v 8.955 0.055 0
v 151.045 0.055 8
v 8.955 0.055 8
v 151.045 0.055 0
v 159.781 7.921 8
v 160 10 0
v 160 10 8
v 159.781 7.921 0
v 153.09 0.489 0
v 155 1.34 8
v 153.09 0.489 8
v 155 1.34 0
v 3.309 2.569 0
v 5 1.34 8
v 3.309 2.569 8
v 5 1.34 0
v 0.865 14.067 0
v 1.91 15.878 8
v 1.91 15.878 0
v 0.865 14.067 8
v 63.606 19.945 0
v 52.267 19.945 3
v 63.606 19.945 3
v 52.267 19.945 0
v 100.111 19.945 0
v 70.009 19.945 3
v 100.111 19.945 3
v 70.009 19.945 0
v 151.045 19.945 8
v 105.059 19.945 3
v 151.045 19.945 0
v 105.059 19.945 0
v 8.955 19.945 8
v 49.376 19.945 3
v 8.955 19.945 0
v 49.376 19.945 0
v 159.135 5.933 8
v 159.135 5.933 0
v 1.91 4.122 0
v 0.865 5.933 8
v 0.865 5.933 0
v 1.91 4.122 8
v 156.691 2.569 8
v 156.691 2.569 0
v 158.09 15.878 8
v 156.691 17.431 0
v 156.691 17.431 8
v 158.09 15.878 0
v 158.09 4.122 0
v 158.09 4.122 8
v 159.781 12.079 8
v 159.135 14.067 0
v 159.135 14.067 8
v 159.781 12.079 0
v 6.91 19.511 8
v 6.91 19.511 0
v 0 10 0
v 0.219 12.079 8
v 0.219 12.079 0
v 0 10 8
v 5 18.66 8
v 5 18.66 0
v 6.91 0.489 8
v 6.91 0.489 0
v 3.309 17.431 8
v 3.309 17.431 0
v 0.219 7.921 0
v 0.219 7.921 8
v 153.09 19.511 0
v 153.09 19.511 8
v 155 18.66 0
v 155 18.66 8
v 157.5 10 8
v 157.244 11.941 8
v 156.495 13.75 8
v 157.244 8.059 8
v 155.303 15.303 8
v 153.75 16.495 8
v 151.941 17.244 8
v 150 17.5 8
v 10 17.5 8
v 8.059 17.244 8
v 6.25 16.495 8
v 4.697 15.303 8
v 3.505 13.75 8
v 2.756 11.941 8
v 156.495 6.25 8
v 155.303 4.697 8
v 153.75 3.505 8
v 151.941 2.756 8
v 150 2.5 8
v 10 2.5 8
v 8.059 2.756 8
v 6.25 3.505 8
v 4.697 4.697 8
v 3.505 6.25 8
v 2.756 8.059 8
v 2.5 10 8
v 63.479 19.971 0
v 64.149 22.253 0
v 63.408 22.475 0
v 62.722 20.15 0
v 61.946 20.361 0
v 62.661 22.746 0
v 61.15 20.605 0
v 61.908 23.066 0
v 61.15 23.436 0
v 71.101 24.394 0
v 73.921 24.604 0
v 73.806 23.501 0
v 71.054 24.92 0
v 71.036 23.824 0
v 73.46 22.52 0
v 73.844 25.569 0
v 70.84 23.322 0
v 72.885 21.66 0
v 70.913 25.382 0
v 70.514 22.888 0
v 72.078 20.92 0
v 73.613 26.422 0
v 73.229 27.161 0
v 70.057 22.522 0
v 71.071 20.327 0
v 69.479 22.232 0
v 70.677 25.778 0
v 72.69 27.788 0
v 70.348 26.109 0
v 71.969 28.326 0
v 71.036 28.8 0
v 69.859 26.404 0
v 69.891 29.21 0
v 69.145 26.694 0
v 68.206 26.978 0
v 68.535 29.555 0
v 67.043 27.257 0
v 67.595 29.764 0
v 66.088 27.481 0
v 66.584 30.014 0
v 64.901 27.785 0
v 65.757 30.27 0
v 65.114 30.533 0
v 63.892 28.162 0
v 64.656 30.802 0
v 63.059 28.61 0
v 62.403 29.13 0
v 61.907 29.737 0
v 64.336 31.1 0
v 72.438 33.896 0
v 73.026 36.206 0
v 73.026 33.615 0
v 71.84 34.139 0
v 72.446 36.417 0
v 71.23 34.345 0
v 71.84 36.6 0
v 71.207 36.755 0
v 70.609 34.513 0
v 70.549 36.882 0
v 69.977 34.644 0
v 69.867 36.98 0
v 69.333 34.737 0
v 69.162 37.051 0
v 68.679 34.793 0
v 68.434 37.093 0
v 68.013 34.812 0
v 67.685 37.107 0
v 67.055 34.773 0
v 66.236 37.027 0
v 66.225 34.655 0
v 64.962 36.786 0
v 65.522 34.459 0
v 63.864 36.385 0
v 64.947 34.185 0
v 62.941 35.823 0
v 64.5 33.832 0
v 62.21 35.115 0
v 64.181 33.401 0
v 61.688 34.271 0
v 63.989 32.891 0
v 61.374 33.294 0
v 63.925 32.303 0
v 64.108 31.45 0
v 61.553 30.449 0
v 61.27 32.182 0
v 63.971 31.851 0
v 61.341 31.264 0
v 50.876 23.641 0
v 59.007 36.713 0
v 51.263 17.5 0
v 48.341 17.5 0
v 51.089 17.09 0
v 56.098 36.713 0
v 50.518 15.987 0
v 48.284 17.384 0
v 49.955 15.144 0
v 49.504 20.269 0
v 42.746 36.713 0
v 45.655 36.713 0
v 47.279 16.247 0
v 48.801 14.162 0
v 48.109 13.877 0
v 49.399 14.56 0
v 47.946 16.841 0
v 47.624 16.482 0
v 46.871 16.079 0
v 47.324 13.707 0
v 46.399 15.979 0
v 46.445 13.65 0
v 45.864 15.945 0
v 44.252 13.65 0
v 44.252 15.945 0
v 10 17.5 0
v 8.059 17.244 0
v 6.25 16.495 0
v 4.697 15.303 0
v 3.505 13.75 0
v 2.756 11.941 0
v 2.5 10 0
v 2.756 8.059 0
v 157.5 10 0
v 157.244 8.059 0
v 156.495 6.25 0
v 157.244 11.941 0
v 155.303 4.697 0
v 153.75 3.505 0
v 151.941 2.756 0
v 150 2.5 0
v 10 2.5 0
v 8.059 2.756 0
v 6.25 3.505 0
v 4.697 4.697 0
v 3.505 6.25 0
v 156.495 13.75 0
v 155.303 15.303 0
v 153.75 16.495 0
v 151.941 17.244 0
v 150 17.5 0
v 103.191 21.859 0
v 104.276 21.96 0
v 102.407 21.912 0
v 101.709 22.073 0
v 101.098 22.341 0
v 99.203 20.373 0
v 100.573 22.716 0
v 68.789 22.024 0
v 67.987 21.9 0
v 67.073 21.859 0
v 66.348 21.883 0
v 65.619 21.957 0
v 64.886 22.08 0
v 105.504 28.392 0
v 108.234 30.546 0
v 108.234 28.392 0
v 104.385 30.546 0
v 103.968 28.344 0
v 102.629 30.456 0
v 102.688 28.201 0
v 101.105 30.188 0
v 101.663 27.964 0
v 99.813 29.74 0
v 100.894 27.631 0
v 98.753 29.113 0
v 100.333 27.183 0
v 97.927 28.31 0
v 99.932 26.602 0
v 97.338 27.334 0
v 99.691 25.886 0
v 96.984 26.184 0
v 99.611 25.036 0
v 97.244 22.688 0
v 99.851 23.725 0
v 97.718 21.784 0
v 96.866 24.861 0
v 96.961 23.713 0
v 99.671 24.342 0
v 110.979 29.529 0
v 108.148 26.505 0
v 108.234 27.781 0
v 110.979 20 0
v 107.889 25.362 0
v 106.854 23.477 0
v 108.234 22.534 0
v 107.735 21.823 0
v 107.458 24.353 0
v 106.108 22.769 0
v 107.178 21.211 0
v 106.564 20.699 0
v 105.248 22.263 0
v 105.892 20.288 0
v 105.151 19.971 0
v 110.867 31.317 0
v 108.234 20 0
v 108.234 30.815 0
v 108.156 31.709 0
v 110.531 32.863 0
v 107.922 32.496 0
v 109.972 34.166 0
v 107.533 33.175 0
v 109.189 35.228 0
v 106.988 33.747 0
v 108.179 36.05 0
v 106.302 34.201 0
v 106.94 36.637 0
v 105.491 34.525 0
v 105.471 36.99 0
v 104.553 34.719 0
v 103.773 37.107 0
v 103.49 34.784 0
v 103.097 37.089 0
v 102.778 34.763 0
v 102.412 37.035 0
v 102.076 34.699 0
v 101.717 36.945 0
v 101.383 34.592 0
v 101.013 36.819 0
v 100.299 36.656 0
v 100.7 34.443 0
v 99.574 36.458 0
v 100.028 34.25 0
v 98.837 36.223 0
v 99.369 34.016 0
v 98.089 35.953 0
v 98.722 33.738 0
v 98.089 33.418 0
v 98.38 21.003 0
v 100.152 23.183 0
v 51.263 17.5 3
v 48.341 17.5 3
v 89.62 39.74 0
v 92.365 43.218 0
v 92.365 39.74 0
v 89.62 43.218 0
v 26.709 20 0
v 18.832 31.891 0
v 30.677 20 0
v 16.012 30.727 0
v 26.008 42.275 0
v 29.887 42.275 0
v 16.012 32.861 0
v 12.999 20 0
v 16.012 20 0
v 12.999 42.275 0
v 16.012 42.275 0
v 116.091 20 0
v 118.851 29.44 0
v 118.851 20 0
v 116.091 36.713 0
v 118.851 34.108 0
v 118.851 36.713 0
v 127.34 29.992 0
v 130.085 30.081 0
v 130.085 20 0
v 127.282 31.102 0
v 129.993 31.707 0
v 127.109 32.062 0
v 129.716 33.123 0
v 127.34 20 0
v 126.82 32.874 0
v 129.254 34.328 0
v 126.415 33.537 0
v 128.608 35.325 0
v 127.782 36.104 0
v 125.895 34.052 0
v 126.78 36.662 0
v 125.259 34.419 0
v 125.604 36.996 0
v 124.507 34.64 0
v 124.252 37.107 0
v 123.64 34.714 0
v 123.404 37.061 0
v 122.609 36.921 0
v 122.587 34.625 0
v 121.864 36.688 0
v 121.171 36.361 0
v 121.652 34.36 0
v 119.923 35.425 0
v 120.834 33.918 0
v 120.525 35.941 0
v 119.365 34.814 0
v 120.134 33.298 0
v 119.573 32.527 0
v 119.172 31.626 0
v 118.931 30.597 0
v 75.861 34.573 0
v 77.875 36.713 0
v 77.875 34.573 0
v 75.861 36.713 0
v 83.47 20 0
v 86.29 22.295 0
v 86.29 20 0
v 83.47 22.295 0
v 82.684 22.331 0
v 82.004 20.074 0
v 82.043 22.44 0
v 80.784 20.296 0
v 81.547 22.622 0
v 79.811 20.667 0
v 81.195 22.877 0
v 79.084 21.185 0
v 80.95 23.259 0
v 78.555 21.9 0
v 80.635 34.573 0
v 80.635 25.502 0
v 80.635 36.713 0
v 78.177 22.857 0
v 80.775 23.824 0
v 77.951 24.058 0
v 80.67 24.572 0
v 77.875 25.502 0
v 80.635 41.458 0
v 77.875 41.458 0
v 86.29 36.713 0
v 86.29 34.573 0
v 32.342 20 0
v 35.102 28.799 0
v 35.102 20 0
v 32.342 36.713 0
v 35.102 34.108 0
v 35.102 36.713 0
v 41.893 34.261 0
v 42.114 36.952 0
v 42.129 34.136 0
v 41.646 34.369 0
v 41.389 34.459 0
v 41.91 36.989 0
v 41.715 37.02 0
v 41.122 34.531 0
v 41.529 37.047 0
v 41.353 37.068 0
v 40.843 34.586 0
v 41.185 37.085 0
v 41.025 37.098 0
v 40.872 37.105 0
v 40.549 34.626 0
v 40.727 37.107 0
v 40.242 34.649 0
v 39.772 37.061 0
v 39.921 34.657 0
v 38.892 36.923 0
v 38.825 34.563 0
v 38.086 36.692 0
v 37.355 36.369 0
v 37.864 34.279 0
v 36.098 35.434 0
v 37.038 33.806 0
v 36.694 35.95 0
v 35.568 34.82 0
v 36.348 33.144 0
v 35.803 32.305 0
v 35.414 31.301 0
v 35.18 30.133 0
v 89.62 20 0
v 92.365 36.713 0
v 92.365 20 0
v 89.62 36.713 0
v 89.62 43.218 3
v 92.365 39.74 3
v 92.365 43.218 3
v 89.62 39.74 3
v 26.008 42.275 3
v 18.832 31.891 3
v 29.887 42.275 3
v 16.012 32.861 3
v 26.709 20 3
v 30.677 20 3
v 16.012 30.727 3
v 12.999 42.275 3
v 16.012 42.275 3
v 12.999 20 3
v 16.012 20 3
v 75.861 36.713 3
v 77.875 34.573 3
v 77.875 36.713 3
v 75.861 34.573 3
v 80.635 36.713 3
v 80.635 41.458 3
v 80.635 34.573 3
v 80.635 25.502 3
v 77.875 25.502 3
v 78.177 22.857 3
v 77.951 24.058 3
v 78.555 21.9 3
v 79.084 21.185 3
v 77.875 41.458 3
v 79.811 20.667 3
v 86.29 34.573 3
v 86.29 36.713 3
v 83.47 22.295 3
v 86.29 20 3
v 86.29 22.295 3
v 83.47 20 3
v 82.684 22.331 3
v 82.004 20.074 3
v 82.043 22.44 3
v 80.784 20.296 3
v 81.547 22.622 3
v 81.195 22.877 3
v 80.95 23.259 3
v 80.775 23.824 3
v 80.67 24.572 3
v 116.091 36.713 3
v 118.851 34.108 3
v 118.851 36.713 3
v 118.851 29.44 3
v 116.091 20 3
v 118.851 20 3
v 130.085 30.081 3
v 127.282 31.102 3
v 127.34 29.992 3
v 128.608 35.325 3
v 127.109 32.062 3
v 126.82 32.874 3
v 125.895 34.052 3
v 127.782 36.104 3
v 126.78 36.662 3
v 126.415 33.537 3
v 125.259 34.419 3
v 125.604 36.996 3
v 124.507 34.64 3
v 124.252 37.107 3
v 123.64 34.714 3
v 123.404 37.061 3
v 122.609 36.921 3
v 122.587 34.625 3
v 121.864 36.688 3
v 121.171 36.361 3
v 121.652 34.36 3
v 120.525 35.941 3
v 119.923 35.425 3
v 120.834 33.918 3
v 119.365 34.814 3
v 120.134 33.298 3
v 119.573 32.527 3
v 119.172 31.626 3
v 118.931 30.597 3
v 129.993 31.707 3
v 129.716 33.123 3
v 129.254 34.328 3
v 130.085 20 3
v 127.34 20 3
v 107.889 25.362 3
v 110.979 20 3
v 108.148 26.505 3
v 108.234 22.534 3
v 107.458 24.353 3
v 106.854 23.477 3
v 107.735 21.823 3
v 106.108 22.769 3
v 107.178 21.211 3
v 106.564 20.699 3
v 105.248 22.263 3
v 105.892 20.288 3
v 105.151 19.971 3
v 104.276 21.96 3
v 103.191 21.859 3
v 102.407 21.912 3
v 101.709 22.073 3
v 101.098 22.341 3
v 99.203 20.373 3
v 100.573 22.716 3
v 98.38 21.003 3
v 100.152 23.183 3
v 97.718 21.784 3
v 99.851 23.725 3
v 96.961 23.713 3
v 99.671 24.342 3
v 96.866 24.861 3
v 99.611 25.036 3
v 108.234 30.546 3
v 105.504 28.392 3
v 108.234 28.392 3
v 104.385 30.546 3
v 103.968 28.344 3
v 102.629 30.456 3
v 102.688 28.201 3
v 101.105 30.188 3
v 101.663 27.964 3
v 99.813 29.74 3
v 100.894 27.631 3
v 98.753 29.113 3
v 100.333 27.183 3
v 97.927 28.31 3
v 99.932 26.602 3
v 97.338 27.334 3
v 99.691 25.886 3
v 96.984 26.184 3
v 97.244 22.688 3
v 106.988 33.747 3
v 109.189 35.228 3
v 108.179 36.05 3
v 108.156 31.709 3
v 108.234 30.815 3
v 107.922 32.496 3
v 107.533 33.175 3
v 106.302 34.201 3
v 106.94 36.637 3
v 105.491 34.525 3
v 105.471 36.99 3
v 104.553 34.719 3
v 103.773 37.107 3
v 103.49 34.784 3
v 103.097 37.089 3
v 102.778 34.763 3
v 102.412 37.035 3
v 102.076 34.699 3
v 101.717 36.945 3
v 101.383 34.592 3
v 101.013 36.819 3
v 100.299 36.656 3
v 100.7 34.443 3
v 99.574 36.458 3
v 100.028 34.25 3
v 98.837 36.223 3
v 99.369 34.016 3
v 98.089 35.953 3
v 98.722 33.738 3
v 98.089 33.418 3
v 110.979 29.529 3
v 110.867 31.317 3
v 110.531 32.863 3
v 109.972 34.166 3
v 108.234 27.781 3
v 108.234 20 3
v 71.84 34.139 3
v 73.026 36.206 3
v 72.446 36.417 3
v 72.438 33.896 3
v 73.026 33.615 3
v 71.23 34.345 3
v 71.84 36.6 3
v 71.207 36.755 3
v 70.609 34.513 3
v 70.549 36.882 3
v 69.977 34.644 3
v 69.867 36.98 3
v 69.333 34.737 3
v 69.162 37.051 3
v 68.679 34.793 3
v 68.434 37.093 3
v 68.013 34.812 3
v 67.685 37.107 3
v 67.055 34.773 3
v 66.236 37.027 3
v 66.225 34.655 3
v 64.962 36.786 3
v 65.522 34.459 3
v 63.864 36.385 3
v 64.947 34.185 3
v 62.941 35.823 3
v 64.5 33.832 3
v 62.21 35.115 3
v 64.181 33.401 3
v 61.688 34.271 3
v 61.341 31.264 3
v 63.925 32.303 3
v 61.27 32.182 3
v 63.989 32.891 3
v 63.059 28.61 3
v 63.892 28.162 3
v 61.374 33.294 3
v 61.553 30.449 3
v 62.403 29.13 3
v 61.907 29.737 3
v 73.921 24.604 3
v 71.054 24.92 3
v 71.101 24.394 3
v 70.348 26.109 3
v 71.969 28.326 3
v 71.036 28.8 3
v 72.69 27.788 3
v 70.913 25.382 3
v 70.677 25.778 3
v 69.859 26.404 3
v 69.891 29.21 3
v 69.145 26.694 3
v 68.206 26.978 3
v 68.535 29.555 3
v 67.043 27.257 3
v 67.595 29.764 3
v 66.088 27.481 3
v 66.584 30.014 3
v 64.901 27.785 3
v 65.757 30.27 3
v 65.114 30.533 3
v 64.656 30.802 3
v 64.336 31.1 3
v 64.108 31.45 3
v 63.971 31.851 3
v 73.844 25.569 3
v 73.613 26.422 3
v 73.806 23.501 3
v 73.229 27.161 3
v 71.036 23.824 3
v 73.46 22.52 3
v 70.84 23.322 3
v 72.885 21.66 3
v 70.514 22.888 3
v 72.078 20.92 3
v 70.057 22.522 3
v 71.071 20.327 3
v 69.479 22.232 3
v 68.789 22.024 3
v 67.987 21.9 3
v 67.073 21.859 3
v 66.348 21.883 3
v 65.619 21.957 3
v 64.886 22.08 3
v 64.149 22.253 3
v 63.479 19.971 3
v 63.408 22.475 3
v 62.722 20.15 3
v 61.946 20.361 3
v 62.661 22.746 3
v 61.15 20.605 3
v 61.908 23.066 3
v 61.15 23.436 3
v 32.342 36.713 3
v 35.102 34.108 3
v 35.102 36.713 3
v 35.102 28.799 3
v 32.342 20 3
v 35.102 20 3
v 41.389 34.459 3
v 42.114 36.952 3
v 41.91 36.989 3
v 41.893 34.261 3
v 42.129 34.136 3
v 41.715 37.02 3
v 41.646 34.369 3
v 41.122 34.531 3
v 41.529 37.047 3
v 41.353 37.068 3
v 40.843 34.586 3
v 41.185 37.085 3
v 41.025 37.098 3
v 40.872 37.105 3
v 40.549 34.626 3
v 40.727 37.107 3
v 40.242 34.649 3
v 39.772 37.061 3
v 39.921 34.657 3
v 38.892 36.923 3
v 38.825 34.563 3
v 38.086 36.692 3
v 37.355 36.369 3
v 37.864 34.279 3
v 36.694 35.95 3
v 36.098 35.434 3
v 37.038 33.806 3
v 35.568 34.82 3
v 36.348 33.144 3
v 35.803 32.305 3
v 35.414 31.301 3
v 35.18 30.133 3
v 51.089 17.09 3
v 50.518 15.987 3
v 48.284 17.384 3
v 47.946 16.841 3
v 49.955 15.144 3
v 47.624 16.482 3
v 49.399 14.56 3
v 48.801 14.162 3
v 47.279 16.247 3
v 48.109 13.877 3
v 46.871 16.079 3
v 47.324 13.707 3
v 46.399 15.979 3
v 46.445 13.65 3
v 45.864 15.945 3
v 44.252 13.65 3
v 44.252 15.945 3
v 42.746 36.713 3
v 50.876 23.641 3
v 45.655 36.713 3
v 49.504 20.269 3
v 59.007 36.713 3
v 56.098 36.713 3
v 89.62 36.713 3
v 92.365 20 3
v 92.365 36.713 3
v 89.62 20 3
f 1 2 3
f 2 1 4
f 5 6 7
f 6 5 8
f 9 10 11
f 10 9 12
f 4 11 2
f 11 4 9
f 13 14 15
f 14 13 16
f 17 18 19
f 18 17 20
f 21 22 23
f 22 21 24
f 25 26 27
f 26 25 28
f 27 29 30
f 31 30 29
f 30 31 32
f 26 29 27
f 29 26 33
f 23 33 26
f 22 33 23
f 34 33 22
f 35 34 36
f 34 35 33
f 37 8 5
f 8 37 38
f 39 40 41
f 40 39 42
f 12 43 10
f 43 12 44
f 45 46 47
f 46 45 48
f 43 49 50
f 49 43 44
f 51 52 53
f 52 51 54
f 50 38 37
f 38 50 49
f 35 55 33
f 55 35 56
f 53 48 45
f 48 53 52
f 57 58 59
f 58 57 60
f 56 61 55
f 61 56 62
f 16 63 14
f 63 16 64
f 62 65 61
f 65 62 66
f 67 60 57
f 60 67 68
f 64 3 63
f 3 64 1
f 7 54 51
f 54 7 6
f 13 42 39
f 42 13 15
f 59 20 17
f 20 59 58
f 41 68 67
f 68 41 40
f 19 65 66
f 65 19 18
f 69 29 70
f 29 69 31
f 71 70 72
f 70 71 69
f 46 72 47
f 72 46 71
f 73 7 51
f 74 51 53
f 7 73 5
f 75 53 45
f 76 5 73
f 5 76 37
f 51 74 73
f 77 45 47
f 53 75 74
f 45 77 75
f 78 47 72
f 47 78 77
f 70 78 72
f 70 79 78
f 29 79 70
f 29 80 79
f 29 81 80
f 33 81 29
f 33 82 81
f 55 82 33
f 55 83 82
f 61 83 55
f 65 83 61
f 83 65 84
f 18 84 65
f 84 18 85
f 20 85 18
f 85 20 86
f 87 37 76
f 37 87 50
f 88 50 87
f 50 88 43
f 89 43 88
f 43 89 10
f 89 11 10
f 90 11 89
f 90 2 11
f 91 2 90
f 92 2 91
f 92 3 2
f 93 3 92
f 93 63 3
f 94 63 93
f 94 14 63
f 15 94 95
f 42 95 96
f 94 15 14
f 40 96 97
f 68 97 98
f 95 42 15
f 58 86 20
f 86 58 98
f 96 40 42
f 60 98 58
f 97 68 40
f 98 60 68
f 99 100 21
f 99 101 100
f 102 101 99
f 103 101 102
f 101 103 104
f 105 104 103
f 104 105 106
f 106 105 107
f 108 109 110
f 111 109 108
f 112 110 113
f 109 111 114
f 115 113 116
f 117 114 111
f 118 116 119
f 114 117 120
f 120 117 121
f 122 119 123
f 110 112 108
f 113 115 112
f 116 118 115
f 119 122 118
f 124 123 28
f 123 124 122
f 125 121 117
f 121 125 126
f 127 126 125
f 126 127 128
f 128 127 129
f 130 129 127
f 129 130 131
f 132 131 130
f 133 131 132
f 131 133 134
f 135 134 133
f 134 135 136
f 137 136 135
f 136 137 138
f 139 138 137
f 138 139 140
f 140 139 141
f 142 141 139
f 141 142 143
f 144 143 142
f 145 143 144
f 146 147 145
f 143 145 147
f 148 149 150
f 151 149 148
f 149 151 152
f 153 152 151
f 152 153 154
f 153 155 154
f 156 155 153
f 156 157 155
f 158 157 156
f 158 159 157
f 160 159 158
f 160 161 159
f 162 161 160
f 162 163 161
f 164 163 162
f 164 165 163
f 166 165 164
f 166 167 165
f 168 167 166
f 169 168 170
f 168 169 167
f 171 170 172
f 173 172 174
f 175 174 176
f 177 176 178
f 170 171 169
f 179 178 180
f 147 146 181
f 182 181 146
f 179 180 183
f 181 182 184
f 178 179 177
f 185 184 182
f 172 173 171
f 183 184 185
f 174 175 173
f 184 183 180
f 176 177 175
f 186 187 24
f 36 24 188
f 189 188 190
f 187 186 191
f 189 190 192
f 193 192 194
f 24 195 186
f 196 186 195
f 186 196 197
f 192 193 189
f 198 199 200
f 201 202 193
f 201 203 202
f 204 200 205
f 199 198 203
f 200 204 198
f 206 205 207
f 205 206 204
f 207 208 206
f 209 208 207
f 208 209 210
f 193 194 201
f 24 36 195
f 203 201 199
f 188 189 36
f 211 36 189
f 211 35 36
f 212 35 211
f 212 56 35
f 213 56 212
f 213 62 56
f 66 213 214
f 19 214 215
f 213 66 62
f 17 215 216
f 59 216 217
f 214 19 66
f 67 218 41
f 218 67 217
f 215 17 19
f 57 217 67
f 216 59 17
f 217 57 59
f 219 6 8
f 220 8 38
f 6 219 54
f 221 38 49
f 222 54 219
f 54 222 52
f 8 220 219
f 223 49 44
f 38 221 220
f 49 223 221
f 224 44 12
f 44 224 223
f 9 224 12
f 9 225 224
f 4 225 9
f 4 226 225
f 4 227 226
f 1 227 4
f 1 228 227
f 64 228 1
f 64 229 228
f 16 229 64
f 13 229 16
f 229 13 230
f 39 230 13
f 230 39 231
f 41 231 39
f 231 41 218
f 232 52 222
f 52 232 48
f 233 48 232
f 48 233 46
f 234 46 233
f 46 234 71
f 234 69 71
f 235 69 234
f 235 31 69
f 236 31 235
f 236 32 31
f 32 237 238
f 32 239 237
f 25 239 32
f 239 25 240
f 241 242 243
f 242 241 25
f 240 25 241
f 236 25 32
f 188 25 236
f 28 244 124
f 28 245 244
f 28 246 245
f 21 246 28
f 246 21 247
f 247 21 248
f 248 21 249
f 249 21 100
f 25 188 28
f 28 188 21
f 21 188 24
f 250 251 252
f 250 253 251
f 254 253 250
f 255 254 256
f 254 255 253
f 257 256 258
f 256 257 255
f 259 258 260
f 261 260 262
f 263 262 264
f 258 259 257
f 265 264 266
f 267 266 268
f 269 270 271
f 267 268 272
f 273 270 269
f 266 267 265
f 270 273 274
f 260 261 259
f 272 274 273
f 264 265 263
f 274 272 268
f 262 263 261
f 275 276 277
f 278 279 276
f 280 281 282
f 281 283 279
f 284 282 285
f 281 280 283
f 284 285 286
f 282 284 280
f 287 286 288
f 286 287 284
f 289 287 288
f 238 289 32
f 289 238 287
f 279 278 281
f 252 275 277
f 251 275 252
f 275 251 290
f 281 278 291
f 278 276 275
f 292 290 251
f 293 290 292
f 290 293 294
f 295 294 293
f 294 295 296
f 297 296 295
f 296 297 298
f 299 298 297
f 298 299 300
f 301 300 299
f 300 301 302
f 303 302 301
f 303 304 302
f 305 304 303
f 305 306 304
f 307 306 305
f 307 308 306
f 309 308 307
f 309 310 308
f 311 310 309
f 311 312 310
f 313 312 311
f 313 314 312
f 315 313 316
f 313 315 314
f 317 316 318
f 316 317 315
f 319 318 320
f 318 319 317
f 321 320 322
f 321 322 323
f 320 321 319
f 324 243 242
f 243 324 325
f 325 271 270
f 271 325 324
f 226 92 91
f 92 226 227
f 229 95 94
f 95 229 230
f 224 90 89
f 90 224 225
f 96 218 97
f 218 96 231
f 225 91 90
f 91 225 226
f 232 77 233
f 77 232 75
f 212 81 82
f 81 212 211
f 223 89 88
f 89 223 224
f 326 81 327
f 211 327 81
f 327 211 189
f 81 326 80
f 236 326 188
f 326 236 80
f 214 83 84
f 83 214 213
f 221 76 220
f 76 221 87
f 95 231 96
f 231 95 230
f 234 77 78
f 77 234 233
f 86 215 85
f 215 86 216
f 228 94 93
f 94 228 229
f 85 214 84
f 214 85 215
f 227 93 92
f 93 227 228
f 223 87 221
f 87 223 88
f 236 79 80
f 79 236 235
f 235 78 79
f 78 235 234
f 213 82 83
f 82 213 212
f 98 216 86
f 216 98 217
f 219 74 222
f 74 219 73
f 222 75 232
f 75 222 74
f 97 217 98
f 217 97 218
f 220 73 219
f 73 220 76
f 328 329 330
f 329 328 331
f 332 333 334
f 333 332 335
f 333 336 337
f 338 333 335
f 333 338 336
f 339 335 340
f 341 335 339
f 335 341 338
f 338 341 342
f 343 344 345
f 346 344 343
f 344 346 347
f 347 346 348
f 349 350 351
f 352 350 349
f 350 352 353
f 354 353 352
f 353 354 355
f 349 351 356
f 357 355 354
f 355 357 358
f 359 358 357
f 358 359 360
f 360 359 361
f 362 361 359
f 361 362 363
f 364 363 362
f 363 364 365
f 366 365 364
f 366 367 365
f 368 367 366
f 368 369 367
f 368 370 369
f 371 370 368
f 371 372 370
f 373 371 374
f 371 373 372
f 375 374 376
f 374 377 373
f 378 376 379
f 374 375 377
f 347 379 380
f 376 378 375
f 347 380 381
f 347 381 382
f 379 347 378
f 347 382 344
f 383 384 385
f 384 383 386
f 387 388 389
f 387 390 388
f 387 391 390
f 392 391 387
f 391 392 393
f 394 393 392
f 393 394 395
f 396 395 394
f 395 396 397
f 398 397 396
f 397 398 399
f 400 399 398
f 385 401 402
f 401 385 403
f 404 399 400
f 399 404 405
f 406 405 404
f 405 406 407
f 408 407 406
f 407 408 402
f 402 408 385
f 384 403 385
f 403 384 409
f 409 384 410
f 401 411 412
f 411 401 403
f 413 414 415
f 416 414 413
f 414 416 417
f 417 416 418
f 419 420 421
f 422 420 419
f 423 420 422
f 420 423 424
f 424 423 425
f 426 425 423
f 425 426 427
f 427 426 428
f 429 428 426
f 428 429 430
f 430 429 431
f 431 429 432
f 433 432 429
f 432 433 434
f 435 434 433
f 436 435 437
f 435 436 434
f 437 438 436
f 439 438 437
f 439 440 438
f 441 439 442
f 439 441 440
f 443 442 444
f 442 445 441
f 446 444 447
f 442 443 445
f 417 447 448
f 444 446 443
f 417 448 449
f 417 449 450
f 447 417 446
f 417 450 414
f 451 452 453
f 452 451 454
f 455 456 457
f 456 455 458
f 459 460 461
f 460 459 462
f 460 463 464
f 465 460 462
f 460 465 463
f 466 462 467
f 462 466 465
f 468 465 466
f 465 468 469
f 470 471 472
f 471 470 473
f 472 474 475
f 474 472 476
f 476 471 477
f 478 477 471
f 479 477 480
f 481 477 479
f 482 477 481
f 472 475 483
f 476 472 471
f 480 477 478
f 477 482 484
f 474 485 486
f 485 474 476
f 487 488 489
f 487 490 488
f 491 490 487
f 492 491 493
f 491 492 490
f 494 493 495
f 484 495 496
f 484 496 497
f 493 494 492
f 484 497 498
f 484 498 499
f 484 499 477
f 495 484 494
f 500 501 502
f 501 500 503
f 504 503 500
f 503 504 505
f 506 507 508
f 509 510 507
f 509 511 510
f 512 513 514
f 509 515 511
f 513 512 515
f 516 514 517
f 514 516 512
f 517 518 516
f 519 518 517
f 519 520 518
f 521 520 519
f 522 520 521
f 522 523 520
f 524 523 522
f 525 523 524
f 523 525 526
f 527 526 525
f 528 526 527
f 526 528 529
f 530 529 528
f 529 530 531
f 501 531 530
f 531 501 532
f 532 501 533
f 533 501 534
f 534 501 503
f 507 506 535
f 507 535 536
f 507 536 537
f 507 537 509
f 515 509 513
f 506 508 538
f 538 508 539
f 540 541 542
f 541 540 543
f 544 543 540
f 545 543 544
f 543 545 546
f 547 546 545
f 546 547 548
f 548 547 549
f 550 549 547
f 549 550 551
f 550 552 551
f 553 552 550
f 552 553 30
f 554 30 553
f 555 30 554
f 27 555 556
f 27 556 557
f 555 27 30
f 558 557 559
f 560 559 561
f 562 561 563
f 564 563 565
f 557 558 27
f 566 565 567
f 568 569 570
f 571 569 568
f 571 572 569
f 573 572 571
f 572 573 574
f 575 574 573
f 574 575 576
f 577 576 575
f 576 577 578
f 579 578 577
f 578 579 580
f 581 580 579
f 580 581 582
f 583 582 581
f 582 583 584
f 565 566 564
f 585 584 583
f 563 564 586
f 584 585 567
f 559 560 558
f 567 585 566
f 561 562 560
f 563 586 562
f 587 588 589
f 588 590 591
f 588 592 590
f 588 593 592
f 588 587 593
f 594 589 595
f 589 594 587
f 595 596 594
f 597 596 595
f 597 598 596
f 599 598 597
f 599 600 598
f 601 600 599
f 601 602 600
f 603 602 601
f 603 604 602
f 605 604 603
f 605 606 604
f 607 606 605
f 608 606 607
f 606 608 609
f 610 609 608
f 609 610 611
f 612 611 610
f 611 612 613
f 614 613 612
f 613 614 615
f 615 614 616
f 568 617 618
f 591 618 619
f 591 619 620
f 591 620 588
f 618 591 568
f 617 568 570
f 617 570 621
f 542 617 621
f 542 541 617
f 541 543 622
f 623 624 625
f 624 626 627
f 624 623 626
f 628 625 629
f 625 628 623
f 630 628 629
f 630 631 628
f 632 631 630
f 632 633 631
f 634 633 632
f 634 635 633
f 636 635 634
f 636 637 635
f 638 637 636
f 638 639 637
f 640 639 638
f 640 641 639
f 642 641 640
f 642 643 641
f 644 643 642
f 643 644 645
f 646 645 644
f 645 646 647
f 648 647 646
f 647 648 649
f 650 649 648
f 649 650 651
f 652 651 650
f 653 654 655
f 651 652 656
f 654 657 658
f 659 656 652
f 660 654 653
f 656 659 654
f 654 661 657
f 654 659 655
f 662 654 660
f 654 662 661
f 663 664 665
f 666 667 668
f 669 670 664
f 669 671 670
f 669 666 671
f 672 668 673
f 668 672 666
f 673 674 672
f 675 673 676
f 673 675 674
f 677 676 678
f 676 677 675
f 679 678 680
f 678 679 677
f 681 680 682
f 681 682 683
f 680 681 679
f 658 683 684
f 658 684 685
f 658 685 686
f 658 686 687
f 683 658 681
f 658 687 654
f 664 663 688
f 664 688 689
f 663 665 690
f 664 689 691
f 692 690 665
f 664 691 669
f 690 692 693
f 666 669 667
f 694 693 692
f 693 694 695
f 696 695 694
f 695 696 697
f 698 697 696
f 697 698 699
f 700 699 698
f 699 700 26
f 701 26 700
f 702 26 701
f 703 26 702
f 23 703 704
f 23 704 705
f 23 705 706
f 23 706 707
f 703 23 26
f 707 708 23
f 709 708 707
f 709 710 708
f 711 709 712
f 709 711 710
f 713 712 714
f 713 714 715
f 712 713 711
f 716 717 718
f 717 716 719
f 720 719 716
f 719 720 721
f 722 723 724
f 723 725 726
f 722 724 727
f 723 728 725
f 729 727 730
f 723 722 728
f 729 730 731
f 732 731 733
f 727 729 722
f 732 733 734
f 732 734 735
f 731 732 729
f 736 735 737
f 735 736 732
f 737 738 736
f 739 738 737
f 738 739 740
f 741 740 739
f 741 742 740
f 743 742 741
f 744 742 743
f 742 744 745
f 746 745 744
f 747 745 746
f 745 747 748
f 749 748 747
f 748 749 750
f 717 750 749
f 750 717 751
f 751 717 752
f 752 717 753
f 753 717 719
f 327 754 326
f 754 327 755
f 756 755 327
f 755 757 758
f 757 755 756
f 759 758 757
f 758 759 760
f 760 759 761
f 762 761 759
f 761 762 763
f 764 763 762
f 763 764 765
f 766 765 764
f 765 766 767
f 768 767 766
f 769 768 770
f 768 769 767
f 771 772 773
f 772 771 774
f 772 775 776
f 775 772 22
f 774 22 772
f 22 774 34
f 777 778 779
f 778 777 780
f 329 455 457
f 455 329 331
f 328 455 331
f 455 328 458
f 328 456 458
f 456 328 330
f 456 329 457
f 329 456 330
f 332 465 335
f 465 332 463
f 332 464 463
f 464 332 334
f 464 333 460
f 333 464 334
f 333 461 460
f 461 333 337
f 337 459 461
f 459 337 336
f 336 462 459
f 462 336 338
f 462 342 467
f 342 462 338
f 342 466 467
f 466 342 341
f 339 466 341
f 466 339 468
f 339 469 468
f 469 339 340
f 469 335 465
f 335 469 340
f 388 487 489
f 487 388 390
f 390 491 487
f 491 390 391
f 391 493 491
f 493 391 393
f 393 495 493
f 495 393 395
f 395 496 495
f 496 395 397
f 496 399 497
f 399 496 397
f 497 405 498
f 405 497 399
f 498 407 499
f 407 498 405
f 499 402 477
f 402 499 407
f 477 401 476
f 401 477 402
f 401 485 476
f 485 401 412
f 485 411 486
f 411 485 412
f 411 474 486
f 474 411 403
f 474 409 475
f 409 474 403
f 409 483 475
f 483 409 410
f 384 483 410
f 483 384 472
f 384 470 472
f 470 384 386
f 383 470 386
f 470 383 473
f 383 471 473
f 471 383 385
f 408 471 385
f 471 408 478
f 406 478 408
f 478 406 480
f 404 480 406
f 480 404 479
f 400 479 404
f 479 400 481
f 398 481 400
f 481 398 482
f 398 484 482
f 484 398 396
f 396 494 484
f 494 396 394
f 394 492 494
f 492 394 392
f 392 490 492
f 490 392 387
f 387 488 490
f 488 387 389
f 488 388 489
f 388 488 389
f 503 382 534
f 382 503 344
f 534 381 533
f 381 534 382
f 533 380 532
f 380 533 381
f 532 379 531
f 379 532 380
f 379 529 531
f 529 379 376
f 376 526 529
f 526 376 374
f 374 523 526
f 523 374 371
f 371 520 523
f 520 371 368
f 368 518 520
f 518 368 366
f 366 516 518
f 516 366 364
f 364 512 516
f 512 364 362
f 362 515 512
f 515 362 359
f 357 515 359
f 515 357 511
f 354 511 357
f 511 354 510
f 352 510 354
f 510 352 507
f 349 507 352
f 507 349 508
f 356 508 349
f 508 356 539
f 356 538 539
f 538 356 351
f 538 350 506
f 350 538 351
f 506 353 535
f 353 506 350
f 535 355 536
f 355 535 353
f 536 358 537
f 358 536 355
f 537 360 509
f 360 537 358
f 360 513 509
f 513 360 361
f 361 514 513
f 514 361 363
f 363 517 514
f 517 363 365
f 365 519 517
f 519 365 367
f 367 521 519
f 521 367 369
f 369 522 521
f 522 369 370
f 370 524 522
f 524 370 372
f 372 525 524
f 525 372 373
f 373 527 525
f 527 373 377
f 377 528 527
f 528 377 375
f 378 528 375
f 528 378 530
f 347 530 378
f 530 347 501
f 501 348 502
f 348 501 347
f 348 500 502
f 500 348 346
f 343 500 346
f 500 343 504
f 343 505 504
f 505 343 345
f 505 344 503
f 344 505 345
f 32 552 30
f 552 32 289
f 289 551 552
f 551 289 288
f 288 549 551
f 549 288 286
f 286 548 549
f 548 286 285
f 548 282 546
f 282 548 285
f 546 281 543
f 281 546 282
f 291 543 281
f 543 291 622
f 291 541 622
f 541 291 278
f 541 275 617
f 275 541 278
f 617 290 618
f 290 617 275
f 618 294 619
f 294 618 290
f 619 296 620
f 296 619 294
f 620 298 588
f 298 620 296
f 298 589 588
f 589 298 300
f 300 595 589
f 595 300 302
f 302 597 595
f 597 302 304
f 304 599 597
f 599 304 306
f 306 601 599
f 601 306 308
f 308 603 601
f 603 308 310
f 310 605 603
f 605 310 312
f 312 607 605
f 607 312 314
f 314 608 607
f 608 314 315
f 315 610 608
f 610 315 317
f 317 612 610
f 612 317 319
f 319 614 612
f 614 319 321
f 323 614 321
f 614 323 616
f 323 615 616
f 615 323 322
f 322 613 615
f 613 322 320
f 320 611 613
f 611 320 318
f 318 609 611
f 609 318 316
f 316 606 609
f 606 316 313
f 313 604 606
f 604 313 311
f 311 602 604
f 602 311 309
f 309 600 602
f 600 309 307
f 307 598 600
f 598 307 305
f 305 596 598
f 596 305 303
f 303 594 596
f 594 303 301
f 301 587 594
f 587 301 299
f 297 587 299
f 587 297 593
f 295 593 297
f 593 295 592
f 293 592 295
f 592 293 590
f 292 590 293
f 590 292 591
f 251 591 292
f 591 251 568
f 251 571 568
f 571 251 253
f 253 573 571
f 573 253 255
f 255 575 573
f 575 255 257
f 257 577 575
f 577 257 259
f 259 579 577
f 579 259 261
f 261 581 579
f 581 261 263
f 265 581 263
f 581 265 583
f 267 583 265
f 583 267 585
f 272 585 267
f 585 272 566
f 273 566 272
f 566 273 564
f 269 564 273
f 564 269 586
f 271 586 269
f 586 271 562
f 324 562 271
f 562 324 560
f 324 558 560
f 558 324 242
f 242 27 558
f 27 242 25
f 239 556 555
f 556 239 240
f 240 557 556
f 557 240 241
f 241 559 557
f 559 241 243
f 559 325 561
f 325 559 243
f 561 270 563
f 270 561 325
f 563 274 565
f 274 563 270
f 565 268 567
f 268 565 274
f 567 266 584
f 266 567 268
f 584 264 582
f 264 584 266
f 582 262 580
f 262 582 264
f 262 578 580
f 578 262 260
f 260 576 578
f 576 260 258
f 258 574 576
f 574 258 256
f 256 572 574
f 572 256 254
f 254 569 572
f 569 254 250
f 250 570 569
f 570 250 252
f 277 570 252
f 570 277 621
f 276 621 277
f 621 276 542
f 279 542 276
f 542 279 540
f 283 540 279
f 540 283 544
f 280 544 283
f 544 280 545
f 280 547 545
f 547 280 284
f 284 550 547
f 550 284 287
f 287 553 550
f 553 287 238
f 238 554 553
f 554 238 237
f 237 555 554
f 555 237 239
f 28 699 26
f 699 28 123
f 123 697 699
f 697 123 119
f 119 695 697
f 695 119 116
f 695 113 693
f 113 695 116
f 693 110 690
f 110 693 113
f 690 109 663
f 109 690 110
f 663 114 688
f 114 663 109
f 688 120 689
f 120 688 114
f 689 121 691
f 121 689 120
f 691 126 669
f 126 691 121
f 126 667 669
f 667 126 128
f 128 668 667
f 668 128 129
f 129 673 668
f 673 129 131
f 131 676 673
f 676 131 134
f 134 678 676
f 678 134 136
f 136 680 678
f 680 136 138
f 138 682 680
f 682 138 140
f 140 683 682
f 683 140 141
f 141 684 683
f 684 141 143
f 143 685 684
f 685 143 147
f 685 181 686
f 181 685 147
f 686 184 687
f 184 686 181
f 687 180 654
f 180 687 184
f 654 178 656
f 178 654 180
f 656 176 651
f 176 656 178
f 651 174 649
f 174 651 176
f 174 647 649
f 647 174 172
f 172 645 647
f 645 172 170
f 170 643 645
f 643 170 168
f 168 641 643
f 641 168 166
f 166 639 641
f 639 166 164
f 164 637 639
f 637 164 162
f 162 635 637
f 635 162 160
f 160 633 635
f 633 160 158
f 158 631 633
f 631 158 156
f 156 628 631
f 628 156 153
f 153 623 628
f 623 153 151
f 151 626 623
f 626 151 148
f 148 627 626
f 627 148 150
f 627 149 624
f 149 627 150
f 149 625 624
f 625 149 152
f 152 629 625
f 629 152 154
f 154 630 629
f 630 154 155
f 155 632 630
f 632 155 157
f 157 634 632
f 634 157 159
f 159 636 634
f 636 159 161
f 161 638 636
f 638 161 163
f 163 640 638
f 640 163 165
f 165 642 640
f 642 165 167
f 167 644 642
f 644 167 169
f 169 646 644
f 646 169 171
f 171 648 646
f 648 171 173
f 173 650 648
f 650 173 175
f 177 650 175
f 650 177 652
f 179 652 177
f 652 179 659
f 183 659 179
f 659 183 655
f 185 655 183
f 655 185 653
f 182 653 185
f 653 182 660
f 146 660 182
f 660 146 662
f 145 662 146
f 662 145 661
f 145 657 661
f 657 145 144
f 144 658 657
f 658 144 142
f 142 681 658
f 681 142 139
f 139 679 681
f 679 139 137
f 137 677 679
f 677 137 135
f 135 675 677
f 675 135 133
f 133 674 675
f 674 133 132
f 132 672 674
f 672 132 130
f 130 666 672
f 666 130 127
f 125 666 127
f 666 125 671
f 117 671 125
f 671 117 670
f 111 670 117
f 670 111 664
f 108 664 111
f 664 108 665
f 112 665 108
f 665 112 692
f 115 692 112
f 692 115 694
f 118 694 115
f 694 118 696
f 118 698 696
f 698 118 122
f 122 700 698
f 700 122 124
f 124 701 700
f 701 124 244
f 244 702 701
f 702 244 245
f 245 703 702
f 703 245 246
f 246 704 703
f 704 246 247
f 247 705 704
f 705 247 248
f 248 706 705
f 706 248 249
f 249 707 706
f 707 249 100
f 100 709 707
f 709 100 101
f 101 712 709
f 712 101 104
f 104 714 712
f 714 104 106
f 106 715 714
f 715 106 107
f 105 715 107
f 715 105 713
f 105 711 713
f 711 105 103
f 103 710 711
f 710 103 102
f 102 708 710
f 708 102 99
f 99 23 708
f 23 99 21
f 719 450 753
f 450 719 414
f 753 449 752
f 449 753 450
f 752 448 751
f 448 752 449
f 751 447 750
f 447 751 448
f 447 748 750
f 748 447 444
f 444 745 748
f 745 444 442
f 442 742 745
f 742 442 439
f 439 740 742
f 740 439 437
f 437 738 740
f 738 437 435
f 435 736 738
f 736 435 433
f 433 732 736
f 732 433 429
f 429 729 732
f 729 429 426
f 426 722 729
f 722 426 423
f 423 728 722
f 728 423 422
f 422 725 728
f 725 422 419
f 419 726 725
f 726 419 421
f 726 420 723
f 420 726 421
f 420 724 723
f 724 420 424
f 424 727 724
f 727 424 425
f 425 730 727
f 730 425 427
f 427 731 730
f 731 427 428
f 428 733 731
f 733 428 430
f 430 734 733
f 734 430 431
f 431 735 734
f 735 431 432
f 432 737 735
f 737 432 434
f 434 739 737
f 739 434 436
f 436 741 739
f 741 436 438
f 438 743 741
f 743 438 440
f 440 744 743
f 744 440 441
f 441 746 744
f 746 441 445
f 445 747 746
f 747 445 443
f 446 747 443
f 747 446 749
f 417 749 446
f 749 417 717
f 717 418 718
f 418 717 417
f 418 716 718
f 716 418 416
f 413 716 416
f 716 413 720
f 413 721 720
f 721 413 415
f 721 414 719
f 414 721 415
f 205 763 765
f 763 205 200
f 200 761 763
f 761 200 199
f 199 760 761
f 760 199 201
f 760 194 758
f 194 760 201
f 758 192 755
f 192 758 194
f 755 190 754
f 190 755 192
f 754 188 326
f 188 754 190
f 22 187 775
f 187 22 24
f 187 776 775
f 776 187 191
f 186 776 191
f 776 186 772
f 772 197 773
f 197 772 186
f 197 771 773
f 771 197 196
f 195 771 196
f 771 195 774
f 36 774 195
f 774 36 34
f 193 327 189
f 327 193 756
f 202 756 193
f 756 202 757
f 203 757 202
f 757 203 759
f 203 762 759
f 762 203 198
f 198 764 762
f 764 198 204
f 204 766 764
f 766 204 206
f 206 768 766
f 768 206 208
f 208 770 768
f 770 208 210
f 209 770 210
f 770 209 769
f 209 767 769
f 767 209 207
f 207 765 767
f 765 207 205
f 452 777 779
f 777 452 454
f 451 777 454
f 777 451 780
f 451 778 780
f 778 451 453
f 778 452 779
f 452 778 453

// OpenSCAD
translate([0, 17, 0])
union(){  
  translate([10, 3, 0])
  linear_extrude(height=3)
  text("Krystian", 22, "Cascadia Code Semibold");
}

translate([10,10, 0])
difference() {
  hull(){
    translate([0, 0, 0])
    cylinder(r=10, h=8);

    translate([140, 0, 0])
    cylinder(r=10, h=8);
  }

  hull(){
    translate([00, 0, -1])
    cylinder(r=7.5, h=20);

    translate([140, 0, 0])
    cylinder(r=7.5, h=20);
  }
}
